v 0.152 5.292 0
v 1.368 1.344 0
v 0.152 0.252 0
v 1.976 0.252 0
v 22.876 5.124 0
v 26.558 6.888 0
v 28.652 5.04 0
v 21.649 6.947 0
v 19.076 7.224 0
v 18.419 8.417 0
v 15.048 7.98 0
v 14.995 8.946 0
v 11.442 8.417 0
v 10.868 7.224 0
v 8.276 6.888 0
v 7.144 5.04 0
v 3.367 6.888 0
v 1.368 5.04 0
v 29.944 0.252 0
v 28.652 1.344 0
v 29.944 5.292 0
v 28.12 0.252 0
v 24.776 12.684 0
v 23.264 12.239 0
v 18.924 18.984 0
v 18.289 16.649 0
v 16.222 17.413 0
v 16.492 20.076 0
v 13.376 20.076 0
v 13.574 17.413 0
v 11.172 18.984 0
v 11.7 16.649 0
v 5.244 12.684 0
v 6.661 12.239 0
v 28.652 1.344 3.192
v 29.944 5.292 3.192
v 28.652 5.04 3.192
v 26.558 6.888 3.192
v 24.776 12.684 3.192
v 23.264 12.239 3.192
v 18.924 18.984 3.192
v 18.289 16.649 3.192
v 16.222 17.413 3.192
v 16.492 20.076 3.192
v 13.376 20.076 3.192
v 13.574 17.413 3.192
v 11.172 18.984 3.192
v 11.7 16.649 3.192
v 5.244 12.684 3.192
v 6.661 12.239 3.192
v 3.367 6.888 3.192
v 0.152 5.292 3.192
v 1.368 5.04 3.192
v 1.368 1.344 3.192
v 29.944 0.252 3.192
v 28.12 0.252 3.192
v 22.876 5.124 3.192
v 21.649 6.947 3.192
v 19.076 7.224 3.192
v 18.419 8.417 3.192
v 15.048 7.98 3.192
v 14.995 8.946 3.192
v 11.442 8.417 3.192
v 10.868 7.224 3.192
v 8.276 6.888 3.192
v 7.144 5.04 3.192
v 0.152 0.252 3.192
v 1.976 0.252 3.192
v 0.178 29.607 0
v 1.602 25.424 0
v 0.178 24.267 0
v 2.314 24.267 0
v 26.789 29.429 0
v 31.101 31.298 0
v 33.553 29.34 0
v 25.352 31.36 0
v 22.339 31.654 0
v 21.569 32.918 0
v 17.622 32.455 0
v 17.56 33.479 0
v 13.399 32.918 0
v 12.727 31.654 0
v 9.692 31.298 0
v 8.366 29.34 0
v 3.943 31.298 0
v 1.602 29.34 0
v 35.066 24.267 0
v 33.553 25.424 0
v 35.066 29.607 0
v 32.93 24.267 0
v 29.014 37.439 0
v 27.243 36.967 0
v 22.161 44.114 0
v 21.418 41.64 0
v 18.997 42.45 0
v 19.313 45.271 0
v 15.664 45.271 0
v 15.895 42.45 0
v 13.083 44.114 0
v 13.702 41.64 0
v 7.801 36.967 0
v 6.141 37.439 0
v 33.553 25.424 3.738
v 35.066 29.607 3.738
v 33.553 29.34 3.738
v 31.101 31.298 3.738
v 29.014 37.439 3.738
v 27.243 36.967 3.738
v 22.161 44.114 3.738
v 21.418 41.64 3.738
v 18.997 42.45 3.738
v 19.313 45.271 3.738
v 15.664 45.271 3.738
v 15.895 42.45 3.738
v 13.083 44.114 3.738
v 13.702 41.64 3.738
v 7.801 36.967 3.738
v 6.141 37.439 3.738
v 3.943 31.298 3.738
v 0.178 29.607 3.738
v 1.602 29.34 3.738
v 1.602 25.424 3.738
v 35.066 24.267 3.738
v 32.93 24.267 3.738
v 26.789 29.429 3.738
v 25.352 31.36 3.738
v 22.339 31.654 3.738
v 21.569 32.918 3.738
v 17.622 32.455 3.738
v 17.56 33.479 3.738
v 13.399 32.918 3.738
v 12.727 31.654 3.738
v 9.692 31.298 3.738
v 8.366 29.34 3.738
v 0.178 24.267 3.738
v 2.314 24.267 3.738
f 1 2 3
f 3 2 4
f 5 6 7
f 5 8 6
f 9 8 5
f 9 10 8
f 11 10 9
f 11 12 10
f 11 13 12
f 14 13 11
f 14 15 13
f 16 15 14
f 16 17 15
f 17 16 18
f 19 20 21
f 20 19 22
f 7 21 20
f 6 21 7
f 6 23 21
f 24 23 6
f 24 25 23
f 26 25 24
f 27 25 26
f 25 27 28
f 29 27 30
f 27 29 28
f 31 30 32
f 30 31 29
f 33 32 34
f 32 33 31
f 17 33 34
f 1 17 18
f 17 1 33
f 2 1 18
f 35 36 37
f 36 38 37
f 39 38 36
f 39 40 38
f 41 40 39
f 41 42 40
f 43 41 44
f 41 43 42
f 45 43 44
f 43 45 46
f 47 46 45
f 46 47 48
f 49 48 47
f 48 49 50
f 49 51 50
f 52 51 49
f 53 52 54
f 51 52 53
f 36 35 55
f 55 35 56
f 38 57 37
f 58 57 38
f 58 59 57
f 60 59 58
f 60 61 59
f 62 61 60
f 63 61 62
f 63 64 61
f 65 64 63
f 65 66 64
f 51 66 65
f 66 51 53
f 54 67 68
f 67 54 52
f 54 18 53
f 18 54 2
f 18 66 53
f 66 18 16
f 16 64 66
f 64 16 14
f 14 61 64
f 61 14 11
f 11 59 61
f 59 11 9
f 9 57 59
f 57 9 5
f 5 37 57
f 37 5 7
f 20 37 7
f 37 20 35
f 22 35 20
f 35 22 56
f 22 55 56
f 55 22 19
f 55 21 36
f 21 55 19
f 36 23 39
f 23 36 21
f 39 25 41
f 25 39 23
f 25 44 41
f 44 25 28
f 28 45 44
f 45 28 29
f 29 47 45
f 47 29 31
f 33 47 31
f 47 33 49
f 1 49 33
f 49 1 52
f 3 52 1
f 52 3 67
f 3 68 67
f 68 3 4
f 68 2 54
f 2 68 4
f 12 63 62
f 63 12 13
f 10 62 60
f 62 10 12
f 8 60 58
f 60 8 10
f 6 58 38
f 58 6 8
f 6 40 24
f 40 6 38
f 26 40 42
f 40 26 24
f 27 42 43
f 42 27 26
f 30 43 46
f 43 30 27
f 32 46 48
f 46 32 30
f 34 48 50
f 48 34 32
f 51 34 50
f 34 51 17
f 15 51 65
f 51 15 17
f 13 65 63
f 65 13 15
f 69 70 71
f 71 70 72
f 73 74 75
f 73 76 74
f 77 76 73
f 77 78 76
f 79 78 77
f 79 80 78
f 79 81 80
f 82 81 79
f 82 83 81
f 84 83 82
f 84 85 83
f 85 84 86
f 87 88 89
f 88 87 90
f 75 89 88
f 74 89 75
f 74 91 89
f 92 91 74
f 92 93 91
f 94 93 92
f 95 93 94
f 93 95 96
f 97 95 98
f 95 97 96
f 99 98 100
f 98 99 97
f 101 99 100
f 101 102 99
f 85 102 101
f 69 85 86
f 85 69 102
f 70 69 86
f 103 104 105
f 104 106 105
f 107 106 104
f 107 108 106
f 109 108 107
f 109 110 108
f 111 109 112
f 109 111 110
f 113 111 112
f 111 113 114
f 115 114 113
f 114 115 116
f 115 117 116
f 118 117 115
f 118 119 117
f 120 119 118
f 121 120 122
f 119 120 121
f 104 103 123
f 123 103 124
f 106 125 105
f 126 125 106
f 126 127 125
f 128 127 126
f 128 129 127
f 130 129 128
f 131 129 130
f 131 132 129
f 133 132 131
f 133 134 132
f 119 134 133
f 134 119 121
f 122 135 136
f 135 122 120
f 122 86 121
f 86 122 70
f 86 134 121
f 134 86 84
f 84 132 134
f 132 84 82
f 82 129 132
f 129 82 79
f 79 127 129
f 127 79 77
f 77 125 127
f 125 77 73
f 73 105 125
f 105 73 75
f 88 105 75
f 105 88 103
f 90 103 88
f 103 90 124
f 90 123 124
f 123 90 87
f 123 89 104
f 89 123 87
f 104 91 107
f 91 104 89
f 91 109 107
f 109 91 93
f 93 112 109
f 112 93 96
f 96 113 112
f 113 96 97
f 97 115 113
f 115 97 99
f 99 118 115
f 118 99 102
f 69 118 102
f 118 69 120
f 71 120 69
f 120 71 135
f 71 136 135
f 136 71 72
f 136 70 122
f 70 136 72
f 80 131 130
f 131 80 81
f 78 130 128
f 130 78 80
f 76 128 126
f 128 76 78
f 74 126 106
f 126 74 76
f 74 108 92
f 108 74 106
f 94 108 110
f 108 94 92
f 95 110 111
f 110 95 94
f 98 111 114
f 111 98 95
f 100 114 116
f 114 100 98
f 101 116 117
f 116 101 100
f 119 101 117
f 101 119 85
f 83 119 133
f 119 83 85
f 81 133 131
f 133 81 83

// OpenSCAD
$fn = 100;

scale(0.1) {
    r30();
    translate([0, 240, 0]) r35();
}

module r35() {
    scale(0.89) rim();
    //#cube([350, 10, 15]);
    //translate([175 - 5, 0, 0]) #cube([10, 210, 15]);
}

module r30() {
    scale([0.76, 0.84, 0.76]) rim();
    //#cube([300, 10, 15]);
    //translate([150 - 5, 0, 0]) #cube([10, 200, 15]);
}

module rim() {
    difference() {
        linear_extrude(42) polygon(points=[
            [2, 3],
            [2, 63],
            [69, 151],
            [147, 226],
            [176, 239],
            [217, 239],
            [249, 226],
            [326, 151],
            [394, 63],
            [394, 3],
            [370, 3],
            [377, 16],
            [377, 60],
            [301, 61],
            [251, 86],
            [198, 95],
            [143, 86],
            [94, 60],
            [18, 60],
            [18, 16],
            [26, 3]
        ]);

        translate([29, 40, -1]) scale([0.85, 0.70, 1.0]) linear_extrude(44) polygon(points=[
            [69, 151],
            [147, 226],
            [176, 239],
            [217, 239],
            [249, 226],
            [326, 151],
            [377, 60],
            [301, 61],
            [251, 86],
            [198, 95],
            [143, 86],
            [94, 60],
            [18, 60],
        ]);
    }
}
